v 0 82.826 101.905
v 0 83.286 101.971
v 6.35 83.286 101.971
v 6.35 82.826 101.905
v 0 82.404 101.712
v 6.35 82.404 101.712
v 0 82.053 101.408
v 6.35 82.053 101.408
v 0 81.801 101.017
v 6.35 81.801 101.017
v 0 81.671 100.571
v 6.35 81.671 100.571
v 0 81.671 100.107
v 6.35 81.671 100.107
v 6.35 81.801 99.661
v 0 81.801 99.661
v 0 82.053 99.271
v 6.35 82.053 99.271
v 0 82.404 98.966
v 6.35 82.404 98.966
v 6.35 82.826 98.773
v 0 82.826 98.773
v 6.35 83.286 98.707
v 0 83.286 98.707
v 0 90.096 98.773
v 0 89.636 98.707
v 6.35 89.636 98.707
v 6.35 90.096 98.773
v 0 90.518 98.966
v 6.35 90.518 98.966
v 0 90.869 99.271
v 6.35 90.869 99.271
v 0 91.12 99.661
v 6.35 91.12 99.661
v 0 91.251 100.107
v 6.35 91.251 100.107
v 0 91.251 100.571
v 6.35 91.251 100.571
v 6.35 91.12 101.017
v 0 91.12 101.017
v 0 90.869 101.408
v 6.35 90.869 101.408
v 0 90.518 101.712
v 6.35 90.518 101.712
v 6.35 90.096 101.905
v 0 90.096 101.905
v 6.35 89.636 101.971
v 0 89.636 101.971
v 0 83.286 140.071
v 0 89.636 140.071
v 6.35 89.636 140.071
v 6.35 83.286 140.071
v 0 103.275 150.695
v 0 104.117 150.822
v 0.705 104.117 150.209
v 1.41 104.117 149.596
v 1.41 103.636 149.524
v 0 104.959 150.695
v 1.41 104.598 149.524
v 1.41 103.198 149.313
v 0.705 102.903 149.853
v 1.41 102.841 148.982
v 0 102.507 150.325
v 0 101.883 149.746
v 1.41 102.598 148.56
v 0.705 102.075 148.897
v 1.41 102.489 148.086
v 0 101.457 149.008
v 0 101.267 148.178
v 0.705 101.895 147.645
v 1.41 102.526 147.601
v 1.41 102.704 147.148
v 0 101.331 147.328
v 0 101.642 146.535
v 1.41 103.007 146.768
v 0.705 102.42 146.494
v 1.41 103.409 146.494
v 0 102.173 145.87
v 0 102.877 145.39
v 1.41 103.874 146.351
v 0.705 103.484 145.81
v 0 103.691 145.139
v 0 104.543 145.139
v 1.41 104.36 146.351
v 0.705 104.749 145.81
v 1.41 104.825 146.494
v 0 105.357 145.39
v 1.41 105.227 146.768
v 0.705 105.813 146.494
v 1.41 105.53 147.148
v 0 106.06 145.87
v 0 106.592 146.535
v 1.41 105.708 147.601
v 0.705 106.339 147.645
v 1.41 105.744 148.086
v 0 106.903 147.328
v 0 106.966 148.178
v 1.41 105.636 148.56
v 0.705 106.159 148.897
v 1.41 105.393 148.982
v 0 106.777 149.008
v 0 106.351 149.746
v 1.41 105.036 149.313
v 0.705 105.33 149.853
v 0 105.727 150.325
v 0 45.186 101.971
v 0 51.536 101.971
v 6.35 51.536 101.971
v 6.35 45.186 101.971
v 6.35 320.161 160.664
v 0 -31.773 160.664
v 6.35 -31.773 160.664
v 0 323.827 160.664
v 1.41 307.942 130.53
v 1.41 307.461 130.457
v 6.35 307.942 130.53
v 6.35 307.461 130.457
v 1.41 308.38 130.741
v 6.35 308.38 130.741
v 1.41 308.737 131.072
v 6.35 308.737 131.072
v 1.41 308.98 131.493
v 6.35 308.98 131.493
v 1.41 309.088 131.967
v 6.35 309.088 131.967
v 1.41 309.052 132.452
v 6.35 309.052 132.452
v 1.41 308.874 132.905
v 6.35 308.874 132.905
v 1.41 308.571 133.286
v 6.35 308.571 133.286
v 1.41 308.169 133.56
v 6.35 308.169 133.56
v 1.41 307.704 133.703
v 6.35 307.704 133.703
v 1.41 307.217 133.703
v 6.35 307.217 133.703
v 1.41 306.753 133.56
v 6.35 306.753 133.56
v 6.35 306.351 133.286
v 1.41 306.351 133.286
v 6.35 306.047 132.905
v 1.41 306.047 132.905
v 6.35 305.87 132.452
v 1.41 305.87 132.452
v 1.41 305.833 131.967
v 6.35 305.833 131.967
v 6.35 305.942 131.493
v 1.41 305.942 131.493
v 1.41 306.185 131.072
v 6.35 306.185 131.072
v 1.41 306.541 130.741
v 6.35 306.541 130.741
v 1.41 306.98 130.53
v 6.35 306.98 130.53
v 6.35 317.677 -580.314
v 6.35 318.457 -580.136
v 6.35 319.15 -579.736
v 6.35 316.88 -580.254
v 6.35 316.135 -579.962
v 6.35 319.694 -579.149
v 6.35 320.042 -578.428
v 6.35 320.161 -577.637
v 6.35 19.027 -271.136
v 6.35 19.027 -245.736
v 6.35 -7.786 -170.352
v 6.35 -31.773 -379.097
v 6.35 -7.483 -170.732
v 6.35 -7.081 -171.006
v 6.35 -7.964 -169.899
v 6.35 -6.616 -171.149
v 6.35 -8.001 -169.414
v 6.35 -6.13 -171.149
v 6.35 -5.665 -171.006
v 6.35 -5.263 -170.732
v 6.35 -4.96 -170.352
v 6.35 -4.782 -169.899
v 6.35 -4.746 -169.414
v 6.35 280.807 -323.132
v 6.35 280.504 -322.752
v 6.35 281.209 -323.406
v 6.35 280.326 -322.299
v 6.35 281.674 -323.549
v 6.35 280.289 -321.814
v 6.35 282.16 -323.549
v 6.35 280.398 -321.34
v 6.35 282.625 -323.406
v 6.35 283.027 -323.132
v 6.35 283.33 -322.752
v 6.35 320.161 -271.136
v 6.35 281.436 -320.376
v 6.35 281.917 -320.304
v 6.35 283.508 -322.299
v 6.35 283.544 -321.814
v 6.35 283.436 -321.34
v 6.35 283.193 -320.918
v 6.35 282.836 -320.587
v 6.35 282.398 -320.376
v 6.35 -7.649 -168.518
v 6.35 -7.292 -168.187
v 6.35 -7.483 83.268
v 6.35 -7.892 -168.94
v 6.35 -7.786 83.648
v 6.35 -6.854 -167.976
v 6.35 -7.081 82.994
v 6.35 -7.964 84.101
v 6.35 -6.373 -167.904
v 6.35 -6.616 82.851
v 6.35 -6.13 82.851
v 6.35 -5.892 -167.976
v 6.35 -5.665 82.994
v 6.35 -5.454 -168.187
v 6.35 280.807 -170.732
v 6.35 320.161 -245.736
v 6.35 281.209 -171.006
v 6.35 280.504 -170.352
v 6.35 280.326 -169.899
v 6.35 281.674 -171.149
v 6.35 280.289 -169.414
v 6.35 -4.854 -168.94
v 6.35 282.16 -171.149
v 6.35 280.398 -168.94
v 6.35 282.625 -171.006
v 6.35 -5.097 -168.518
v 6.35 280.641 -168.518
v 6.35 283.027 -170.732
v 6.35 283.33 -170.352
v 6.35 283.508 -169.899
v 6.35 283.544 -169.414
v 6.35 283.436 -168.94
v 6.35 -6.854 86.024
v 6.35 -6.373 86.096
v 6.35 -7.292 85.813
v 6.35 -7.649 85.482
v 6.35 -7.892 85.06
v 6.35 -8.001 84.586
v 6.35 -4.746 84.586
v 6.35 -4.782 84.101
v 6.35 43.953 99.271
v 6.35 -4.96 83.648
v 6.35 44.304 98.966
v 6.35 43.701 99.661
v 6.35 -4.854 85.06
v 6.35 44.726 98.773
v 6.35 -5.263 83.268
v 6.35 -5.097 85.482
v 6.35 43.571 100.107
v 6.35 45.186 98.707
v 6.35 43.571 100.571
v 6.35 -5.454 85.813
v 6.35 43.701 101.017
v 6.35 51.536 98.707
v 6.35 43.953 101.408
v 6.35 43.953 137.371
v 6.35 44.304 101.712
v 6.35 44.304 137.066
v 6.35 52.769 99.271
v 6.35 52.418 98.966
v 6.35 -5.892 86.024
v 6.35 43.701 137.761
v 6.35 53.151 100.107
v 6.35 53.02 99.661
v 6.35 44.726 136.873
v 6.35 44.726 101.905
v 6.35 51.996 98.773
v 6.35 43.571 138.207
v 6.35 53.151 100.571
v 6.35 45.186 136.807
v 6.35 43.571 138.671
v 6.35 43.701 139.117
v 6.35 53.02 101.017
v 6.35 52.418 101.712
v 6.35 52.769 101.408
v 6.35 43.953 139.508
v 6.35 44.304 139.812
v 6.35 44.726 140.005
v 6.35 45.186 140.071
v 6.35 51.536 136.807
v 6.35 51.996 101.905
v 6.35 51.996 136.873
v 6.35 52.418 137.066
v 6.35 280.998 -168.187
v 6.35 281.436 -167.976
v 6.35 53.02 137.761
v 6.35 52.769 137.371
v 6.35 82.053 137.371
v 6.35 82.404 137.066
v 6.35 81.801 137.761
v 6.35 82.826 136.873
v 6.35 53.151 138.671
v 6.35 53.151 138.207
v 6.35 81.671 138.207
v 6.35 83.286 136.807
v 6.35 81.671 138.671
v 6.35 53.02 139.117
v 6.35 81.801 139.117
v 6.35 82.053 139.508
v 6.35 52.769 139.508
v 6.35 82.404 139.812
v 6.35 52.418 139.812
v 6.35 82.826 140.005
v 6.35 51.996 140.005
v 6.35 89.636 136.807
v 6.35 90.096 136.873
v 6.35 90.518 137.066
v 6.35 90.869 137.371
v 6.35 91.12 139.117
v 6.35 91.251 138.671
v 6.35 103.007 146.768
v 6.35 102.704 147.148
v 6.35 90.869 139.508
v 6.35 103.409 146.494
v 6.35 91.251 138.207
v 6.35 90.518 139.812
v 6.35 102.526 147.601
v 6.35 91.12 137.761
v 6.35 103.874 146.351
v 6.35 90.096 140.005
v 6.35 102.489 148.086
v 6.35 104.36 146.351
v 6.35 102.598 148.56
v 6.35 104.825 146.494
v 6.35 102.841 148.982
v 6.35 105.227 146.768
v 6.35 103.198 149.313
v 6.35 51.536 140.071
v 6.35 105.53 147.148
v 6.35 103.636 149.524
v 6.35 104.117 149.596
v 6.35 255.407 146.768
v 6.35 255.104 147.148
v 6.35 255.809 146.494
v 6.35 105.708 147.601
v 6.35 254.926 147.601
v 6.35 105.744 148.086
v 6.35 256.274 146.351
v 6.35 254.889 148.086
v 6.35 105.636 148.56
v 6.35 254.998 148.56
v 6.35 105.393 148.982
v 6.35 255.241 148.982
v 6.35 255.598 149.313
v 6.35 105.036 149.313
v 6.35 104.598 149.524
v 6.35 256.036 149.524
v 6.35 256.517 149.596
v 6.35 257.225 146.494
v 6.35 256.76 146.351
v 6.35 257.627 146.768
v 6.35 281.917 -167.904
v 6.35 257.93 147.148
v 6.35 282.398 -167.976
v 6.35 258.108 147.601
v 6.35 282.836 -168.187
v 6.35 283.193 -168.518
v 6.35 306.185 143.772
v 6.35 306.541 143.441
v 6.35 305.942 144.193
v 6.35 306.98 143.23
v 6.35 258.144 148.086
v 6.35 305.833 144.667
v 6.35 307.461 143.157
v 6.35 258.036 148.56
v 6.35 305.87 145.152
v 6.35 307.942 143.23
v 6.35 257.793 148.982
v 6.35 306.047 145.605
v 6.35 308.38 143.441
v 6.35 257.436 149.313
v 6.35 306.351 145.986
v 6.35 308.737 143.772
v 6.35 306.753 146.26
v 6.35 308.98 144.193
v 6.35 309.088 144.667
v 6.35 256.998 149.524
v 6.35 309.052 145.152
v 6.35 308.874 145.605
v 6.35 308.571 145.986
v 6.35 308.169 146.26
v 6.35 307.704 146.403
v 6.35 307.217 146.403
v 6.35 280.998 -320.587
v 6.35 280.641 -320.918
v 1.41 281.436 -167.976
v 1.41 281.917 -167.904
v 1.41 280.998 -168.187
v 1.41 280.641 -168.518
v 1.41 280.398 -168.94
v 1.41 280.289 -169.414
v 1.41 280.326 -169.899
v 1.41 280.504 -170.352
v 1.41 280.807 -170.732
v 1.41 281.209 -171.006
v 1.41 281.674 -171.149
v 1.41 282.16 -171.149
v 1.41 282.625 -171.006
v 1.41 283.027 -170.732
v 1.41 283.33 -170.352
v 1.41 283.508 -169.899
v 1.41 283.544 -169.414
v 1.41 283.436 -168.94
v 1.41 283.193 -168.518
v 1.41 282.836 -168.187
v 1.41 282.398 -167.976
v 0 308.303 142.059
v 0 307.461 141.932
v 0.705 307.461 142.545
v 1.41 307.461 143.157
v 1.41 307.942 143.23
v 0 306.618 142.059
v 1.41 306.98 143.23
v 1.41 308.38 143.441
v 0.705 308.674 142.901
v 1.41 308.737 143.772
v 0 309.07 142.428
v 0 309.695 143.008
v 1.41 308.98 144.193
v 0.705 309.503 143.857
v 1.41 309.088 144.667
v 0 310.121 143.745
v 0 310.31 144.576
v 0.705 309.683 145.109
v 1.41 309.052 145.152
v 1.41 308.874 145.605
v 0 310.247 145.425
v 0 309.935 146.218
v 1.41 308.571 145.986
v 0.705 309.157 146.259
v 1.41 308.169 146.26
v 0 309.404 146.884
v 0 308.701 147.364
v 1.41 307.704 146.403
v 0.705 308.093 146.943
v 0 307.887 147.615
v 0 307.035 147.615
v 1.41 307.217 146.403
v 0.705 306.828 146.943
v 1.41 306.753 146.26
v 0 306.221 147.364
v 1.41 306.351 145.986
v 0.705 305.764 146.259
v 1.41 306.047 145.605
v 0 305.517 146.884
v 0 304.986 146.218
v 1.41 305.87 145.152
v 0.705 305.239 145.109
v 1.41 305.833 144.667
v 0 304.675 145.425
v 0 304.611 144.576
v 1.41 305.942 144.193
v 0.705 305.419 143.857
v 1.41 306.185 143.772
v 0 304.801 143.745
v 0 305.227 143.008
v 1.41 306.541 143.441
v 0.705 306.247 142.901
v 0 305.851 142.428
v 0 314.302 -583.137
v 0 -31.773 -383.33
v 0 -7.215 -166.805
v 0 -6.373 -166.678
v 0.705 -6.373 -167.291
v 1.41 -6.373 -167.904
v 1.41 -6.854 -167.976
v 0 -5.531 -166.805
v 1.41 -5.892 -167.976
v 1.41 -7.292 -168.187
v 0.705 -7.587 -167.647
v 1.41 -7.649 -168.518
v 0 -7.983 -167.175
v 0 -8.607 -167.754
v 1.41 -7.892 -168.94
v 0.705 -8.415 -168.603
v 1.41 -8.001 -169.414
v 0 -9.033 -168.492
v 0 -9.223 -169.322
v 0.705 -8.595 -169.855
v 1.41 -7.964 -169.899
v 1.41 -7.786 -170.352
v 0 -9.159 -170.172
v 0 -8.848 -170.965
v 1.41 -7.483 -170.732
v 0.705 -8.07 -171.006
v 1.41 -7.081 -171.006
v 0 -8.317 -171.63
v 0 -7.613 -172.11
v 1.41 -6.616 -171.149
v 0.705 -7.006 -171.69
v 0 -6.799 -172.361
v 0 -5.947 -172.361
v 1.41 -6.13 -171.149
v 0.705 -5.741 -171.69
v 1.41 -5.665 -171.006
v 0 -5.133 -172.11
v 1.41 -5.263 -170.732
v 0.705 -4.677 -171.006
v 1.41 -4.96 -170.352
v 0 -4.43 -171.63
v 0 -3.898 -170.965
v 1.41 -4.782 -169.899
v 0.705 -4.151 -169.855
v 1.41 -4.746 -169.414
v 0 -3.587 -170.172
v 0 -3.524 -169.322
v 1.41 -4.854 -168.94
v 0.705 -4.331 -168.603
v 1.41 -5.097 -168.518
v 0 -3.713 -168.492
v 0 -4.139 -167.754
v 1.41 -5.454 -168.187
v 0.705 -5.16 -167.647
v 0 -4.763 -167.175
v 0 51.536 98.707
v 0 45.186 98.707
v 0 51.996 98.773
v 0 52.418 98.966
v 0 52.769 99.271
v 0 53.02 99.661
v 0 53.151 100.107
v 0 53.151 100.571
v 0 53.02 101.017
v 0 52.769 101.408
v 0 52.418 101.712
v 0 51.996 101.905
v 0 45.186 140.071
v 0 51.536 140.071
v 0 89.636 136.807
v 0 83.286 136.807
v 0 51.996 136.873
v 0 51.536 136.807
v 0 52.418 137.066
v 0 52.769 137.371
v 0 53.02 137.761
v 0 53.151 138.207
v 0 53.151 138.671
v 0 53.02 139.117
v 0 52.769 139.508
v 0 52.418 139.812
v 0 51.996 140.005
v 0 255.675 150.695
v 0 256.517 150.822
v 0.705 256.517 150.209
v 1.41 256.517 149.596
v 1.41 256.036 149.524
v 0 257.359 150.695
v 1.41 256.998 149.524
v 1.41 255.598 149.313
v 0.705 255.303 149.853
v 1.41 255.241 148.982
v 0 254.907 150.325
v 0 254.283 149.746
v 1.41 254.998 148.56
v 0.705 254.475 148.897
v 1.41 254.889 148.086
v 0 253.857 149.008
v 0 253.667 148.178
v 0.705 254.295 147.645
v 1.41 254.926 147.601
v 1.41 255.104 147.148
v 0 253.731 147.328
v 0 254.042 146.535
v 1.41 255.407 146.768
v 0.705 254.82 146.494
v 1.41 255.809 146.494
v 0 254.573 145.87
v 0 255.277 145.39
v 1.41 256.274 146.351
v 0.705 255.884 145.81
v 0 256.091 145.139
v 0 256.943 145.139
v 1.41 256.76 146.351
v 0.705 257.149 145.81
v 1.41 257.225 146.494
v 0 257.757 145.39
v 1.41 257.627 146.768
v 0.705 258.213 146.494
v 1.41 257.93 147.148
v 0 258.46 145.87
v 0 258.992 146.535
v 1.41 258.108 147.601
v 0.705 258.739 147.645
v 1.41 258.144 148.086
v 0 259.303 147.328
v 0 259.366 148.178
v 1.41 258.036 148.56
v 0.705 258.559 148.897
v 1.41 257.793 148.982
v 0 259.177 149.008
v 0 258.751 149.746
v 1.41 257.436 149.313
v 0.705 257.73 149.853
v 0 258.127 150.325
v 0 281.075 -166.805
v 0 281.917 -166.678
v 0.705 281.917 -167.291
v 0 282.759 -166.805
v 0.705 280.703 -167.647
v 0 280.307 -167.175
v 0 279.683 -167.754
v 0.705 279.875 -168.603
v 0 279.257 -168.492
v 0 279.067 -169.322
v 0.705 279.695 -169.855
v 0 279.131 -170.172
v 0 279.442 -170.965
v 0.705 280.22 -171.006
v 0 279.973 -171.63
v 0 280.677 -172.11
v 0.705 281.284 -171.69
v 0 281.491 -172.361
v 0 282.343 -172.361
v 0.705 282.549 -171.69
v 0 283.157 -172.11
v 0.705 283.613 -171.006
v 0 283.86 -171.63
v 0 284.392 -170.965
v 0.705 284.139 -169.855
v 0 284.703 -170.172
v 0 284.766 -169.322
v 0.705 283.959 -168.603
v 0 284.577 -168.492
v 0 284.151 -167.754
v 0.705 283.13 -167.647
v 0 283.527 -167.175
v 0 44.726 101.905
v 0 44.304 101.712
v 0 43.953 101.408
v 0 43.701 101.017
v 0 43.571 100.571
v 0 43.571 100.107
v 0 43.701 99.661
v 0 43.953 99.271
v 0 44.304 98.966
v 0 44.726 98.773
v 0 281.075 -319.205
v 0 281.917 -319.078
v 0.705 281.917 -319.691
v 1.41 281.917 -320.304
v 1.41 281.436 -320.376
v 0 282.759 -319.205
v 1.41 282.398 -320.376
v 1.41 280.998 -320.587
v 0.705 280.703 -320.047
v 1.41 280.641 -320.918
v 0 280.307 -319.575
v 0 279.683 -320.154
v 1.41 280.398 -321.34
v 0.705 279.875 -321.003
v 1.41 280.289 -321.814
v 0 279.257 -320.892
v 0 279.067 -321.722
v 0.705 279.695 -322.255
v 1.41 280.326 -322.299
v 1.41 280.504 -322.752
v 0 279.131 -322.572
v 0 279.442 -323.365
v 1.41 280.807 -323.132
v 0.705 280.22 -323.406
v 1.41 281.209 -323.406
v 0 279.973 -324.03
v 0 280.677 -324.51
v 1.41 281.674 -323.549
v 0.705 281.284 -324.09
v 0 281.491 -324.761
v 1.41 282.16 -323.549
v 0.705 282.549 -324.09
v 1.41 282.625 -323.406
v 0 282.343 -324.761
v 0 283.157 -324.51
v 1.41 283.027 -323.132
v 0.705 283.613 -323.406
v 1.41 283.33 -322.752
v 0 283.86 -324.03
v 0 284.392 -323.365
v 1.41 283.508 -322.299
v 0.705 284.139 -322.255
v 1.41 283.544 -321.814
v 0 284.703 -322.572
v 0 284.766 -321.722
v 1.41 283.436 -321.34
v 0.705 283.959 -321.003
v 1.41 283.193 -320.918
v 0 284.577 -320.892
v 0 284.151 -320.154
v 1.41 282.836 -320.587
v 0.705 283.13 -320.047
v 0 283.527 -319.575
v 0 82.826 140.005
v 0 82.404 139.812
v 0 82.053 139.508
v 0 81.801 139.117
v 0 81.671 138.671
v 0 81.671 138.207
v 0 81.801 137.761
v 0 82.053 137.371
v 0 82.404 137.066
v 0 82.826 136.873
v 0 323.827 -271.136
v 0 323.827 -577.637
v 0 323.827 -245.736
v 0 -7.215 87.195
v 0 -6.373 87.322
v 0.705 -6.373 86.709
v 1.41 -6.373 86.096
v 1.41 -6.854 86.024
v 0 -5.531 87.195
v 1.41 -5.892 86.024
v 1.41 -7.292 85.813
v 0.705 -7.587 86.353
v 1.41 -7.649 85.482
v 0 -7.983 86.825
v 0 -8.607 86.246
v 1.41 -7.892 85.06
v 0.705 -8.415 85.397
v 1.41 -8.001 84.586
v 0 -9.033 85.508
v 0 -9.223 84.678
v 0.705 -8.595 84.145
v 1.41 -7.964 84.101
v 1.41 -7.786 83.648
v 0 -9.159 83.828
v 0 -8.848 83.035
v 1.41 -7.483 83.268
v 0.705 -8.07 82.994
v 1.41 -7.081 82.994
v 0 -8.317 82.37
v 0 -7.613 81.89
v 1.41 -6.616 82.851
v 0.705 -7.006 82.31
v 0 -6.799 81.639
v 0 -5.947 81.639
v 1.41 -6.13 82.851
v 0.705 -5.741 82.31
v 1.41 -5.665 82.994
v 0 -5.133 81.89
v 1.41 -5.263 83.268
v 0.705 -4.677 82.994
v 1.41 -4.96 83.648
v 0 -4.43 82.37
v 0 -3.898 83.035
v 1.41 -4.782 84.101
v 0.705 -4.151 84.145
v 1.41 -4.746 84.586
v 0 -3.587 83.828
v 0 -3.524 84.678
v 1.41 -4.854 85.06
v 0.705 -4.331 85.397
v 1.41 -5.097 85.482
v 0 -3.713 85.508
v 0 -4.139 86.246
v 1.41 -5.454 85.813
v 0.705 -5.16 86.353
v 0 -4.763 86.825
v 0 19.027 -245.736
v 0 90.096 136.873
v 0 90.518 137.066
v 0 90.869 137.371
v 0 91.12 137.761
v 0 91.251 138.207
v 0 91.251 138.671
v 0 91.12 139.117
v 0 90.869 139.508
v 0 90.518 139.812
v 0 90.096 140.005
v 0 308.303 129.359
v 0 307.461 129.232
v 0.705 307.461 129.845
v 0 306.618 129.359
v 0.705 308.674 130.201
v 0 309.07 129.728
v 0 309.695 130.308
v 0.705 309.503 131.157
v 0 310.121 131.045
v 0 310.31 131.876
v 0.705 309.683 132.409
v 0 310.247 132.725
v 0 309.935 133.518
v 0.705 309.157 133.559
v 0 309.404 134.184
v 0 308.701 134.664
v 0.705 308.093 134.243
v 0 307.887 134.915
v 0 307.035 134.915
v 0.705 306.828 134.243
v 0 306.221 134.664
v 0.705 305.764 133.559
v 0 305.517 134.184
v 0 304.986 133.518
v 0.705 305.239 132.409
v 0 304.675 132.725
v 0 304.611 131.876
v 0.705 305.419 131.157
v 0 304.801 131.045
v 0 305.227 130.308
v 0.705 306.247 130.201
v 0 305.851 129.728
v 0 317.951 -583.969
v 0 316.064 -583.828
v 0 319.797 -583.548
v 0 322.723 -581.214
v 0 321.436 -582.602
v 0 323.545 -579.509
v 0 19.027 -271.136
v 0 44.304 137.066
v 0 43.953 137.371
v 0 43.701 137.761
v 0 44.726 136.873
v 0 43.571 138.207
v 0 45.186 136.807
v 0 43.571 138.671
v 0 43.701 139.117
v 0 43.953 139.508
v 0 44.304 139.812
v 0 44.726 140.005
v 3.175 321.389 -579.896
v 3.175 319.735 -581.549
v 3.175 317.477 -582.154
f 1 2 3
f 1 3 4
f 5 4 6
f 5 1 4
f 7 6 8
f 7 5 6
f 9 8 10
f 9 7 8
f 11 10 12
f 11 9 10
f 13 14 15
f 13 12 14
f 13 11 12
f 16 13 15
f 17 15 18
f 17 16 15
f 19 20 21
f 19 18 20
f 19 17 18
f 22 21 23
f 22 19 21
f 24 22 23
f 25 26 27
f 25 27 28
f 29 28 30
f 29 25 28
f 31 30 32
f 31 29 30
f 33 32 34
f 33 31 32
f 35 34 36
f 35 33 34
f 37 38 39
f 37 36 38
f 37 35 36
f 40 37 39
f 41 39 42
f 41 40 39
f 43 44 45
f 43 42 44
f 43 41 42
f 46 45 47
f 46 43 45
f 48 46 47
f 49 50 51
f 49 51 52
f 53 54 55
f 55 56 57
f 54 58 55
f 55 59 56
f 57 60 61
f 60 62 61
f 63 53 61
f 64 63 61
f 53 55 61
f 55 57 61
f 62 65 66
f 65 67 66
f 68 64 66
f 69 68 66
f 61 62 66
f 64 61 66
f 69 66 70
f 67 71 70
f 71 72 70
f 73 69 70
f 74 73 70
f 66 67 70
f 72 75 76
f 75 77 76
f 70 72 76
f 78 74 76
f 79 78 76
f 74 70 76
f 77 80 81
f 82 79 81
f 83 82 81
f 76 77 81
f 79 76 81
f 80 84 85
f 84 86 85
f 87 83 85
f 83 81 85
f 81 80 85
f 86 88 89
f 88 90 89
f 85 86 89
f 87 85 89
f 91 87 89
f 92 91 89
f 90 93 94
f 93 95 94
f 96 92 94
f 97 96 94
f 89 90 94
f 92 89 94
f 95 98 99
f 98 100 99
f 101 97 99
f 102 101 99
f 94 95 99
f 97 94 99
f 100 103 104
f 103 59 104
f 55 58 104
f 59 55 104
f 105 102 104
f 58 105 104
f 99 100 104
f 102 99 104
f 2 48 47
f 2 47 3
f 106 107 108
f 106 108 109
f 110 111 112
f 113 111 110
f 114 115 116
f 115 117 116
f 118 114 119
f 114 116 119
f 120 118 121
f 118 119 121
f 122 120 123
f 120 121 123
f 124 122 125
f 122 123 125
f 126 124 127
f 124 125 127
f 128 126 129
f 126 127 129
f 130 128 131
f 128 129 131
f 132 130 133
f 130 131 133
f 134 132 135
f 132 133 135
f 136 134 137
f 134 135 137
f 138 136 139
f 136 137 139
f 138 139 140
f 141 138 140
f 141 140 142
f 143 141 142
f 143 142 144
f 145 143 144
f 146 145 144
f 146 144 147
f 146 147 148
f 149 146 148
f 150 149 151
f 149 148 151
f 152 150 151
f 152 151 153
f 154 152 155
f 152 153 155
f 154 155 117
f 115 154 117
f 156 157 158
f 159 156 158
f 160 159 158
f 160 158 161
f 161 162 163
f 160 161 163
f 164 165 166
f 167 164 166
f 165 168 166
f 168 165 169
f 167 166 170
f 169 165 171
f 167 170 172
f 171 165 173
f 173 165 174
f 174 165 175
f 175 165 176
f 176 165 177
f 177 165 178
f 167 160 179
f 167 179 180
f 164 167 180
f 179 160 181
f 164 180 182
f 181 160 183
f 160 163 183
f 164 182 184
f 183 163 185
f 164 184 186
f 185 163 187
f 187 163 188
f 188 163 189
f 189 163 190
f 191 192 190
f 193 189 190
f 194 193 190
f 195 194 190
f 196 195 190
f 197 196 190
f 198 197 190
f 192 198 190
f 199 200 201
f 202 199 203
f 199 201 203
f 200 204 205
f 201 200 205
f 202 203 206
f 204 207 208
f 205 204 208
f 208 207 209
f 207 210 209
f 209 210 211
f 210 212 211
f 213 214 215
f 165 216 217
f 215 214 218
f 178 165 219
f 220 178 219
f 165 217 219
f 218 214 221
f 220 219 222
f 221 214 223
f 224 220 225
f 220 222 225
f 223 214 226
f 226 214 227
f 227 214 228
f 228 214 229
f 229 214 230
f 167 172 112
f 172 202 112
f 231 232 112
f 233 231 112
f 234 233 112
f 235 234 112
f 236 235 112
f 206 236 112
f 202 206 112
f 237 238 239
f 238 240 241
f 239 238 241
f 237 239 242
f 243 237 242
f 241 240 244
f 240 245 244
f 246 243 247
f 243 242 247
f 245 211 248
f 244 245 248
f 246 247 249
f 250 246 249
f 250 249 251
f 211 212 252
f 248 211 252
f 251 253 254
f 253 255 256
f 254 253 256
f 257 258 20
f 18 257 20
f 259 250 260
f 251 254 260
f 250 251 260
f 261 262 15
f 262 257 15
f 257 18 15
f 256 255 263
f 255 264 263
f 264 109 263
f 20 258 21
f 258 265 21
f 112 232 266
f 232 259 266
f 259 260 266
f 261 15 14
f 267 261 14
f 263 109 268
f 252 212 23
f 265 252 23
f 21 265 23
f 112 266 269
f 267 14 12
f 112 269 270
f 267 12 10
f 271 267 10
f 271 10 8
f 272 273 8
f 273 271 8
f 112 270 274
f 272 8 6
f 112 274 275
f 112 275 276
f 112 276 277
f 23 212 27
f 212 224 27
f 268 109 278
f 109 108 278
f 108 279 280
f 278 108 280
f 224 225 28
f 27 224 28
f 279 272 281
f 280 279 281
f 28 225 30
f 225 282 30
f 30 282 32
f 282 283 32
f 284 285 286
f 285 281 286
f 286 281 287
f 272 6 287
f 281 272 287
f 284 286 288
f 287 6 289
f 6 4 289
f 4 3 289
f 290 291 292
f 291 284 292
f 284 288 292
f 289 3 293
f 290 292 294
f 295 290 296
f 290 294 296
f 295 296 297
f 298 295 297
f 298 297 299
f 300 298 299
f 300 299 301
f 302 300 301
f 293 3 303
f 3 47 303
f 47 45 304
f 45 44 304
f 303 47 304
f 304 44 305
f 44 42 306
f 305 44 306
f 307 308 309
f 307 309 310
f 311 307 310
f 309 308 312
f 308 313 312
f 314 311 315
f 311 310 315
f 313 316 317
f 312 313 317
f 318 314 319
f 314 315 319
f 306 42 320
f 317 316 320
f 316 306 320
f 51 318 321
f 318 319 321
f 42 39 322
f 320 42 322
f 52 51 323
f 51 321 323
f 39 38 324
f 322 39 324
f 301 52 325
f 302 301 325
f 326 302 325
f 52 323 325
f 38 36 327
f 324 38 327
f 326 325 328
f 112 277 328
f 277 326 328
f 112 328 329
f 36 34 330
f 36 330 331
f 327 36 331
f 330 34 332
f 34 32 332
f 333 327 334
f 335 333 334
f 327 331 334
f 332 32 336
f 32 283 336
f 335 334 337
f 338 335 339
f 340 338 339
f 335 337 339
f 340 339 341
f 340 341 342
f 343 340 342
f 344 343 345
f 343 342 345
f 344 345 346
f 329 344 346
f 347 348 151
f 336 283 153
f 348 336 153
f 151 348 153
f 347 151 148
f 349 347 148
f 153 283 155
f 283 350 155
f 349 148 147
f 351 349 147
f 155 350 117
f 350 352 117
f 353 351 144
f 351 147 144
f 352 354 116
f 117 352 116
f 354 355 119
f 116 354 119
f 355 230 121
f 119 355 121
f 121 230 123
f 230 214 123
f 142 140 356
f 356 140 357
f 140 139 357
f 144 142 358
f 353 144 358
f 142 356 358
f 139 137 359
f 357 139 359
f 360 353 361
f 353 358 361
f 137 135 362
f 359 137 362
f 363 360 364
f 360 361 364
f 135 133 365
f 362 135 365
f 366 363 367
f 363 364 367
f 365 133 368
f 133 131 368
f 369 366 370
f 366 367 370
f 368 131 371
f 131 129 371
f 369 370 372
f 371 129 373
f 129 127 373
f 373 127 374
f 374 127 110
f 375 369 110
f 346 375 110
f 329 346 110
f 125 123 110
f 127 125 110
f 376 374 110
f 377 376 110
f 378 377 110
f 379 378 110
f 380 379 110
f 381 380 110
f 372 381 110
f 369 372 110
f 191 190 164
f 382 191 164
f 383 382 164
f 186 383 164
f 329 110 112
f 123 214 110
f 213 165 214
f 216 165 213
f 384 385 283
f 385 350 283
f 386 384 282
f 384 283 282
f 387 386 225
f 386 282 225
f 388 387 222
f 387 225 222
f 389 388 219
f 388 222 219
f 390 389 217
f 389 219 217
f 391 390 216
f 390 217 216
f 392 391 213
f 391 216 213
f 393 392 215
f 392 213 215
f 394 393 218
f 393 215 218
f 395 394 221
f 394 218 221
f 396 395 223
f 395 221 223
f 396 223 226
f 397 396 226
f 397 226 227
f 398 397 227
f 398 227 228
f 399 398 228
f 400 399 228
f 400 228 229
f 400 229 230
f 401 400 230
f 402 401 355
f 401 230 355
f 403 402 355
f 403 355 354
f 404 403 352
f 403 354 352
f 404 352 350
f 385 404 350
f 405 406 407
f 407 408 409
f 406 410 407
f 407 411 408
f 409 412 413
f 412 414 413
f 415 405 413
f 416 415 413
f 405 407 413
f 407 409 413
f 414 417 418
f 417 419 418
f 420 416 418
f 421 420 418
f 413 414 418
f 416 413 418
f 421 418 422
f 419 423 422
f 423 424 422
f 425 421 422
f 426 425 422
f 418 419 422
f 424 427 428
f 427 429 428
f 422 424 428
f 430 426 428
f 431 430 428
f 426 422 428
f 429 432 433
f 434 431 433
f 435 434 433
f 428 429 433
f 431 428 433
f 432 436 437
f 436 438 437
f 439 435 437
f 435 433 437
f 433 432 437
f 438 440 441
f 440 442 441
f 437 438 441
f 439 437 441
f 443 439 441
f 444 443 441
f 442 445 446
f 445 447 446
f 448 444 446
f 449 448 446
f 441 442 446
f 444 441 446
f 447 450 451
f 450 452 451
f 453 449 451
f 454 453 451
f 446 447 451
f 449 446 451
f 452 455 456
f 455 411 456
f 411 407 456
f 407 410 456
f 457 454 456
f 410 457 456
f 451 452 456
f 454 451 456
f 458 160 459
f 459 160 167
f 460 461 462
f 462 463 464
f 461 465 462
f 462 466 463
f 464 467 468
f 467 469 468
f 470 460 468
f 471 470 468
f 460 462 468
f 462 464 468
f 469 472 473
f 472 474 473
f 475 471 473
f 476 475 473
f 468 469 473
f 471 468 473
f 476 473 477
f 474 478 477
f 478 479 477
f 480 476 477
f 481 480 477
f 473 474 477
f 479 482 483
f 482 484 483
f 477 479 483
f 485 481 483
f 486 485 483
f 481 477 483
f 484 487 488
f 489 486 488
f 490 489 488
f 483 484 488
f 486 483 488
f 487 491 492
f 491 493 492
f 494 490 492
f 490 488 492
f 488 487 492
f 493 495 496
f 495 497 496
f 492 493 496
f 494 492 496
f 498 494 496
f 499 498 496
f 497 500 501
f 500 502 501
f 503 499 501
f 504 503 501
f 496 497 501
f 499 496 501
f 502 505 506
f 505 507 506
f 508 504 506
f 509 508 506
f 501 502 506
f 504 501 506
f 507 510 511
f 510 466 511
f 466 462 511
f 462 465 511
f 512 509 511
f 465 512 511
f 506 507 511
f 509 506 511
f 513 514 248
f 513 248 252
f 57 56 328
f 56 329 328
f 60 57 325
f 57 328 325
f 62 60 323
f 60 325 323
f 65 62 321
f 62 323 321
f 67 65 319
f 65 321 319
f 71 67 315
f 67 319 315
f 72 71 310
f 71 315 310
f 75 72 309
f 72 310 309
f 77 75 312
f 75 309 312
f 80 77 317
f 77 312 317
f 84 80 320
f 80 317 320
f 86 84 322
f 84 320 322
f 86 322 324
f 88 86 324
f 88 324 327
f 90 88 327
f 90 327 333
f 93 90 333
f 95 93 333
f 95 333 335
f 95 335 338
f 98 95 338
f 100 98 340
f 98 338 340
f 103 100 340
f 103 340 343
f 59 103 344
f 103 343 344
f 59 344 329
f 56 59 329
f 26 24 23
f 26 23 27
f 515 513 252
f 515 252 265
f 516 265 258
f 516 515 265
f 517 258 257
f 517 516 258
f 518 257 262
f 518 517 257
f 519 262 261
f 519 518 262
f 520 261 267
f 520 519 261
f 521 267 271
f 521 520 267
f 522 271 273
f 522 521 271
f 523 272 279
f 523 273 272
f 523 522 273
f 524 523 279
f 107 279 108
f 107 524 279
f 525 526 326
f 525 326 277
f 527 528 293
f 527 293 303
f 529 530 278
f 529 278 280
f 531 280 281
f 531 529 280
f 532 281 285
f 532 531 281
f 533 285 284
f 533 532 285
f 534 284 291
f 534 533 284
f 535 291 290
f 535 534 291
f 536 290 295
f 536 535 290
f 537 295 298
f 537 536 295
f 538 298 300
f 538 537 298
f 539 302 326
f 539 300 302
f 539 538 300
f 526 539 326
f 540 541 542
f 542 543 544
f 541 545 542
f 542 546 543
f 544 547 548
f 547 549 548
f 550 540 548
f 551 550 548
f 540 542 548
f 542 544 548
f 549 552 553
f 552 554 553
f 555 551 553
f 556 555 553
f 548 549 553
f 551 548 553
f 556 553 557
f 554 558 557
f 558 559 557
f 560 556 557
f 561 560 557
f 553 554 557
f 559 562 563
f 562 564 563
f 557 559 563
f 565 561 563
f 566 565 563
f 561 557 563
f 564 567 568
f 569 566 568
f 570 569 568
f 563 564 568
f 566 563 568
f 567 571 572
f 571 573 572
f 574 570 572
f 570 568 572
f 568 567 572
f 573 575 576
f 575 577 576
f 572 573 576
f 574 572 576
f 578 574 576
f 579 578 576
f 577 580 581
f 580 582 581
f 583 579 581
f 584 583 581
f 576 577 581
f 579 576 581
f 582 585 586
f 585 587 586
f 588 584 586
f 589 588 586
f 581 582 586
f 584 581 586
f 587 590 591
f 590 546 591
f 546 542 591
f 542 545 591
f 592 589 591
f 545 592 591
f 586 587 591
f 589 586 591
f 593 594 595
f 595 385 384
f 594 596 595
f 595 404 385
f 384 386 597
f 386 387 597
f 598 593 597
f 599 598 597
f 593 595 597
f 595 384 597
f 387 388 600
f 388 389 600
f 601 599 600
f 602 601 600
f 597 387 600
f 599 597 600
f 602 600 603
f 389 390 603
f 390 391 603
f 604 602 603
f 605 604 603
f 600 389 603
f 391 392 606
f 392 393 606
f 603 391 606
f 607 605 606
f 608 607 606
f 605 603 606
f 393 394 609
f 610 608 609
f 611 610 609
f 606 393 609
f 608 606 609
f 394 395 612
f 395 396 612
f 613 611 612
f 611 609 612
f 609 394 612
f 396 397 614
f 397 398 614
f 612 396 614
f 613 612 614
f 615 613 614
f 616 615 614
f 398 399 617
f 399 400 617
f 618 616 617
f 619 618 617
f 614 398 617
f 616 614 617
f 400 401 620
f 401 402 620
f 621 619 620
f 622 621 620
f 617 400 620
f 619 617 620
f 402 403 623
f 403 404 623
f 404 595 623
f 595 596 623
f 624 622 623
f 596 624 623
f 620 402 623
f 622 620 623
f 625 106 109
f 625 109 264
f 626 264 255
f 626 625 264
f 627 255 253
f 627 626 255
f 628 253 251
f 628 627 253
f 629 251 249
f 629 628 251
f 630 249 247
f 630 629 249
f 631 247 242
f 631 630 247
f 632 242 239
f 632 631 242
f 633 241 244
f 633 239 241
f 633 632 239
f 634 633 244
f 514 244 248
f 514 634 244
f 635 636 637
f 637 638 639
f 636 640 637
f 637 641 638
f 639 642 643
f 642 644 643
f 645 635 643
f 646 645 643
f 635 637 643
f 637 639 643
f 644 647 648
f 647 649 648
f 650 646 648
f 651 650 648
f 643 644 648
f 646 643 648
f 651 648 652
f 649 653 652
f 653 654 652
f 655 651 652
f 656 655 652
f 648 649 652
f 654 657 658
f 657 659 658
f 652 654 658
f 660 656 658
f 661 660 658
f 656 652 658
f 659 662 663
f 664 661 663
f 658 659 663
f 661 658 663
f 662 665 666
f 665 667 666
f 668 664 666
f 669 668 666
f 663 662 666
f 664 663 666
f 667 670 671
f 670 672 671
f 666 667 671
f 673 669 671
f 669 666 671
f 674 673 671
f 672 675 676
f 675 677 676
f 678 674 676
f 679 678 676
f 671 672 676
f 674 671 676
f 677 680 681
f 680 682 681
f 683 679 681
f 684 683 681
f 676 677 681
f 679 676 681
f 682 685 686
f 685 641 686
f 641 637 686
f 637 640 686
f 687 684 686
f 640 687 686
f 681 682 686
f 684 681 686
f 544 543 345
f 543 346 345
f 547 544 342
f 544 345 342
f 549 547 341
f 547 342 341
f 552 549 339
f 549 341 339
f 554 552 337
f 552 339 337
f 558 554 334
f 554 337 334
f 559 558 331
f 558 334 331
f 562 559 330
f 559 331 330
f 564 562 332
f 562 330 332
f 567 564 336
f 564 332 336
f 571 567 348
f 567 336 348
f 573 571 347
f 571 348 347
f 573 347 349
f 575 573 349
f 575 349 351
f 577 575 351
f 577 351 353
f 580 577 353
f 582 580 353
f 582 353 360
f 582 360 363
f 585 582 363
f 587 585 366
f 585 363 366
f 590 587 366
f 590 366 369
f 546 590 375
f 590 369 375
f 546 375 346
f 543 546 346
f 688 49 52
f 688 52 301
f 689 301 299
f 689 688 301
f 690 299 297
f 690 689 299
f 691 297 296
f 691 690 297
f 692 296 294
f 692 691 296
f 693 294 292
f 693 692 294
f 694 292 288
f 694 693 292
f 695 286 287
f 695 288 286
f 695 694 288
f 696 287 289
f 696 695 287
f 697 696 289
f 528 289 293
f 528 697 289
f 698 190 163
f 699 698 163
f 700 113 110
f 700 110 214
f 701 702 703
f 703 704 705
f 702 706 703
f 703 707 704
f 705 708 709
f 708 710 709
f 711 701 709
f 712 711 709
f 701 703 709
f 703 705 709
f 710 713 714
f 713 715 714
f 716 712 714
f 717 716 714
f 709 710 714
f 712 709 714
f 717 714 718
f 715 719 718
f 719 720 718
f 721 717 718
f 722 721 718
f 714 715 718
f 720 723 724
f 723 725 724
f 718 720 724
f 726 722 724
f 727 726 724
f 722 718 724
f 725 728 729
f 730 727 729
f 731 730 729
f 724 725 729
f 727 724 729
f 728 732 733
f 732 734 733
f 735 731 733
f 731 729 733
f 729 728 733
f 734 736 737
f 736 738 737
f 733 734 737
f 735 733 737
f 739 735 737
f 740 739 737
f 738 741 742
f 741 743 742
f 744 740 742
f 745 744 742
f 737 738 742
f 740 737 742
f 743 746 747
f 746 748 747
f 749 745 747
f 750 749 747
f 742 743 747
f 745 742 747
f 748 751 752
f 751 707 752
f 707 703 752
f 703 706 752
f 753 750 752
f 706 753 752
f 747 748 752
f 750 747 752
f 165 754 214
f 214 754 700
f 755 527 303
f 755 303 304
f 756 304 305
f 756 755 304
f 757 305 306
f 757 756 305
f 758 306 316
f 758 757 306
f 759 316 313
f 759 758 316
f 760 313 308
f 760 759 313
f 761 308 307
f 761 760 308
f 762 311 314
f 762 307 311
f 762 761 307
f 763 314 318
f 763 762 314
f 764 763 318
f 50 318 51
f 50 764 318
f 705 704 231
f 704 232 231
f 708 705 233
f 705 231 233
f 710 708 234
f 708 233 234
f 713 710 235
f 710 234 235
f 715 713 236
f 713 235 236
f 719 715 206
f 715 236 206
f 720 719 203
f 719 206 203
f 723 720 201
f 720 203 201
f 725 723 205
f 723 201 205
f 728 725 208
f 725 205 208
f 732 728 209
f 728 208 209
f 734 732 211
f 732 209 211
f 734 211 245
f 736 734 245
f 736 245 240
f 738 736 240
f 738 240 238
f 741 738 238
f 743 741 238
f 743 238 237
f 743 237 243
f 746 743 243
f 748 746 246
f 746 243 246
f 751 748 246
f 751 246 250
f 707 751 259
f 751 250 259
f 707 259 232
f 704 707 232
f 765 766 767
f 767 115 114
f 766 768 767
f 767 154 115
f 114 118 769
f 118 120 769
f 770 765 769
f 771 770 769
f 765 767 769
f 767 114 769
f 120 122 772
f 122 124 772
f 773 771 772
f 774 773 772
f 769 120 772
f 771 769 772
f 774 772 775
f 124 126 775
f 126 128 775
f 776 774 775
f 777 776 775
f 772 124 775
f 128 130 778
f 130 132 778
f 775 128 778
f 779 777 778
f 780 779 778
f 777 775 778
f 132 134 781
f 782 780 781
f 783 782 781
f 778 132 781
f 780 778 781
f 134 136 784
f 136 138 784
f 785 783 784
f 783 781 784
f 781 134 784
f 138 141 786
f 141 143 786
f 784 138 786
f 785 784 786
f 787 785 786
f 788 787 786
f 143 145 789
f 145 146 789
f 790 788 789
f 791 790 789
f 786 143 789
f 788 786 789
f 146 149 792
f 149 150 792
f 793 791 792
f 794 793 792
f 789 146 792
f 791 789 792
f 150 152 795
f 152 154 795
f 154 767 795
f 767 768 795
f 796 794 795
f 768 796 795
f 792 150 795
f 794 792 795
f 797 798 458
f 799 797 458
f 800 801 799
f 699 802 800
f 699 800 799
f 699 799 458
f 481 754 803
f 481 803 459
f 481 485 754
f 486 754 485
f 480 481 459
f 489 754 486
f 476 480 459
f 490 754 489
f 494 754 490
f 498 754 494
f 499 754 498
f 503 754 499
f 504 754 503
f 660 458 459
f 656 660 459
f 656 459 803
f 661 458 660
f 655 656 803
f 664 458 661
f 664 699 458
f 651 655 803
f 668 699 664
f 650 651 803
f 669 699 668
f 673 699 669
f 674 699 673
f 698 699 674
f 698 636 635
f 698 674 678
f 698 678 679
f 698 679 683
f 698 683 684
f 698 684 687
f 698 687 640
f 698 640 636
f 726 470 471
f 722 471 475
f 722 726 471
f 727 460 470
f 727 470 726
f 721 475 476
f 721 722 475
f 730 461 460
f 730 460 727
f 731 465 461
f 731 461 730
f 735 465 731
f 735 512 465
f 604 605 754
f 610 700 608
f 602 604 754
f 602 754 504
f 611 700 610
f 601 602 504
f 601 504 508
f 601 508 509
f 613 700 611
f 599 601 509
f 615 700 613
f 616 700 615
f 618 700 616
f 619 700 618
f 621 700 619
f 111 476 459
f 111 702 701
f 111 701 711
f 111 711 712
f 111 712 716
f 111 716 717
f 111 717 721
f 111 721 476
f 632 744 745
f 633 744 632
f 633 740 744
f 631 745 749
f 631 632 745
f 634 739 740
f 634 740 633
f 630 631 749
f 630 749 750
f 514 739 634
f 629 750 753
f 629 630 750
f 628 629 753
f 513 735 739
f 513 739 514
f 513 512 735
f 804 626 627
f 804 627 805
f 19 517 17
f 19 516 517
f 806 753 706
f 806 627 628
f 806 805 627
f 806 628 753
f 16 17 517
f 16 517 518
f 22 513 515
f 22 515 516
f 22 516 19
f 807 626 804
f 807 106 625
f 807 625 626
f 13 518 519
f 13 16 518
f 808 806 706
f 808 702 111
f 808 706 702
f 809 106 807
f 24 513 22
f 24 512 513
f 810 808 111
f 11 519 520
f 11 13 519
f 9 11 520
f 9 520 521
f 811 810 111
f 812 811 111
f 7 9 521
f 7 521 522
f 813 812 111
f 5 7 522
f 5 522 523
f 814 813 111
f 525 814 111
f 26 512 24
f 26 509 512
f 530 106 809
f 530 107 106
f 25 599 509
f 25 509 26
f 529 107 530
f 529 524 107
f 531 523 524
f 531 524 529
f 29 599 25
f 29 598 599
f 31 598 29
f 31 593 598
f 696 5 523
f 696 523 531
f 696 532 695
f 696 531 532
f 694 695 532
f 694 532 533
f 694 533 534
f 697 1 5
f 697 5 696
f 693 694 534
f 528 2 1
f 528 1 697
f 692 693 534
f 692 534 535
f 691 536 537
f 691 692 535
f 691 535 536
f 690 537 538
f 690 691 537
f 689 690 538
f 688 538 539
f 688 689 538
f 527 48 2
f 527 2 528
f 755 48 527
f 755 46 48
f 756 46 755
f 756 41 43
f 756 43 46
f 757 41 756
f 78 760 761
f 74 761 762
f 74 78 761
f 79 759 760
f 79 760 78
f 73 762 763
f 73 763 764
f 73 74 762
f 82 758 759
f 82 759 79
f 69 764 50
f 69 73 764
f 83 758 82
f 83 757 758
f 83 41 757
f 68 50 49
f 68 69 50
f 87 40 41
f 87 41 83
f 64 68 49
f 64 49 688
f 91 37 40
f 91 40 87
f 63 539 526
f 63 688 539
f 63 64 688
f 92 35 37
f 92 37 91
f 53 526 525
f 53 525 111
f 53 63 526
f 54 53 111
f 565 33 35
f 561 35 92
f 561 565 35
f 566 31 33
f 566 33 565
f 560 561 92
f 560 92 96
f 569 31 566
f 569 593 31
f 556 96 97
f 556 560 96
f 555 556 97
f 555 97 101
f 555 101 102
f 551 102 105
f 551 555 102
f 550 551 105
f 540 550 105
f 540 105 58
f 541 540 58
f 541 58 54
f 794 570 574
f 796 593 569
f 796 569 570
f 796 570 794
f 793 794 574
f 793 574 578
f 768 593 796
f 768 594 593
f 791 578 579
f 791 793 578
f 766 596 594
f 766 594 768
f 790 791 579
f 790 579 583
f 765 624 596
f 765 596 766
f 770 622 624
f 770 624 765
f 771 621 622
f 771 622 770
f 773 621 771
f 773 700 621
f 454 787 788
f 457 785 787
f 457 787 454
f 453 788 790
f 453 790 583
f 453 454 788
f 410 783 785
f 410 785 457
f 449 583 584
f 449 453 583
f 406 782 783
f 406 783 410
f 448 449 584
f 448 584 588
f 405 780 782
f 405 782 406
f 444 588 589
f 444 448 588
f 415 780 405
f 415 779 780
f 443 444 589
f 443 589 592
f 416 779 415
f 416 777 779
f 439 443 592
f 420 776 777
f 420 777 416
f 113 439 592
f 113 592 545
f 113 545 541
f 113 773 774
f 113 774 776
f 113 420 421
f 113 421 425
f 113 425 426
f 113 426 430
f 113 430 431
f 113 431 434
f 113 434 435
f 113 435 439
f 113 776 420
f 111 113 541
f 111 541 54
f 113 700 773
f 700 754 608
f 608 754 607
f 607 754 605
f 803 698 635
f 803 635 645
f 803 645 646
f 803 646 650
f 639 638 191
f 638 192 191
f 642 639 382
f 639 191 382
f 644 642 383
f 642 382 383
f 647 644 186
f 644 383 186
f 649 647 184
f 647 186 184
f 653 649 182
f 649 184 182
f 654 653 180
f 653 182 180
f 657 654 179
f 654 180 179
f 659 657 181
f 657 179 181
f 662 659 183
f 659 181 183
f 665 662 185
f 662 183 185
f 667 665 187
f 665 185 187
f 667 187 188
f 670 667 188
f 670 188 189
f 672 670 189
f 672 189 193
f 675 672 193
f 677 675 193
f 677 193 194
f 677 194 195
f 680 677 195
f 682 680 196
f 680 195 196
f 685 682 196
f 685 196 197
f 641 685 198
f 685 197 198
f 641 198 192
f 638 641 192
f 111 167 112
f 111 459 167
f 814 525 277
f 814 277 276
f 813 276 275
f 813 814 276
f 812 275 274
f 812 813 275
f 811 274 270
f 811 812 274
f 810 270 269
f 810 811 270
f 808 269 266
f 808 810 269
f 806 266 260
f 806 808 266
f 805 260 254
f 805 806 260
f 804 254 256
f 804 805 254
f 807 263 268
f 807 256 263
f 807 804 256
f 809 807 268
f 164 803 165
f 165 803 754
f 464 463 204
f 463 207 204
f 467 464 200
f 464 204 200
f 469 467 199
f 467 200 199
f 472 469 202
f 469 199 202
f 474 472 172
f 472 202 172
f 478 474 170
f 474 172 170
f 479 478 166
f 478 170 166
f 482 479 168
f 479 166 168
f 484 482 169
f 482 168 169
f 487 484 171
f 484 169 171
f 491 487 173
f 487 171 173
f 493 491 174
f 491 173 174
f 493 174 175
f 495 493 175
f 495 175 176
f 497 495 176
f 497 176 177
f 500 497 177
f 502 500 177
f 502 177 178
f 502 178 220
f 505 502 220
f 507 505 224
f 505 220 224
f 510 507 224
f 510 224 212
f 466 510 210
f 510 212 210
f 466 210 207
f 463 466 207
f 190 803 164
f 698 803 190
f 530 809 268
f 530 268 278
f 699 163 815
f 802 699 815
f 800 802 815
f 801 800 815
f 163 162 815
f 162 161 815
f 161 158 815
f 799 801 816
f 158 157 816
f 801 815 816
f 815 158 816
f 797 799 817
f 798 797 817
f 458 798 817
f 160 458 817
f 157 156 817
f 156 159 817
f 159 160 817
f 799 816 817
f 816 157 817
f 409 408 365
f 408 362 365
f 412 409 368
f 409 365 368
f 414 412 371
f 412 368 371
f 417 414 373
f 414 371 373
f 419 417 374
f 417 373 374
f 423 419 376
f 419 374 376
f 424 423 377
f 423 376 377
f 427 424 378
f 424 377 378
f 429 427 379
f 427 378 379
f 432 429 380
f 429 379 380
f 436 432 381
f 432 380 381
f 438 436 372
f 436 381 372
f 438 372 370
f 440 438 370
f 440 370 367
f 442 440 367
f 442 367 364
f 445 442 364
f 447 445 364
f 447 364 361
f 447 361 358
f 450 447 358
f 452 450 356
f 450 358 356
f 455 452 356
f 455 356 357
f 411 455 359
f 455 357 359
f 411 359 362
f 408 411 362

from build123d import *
from OCP.BRepFilletAPI import BRepFilletAPI_MakeChamfer

# Parameters (mm, degrees)
BOSS_EXTRUDE1_DEPTH                            = 6.35
SKETCH2_W                                      = 25.4
SKETCH2_H                                      = 304.8
CUT_EXTRUDE1_DEPTH                             = 672.86027017
FILLET1_R                                      = 6.35
CHAMFER3_SIZE                                  = 3.666174209
CHAMFER3_SIZE_2                                = 6.35
CSK_FOR_4_FLAT_HEAD_MACHINE_SCREW1_D           = 3.2639
CSK_FOR_4_FLAT_HEAD_MACHINE_SCREW1_CSINK_D     = 5.715
CSK_FOR_4_FLAT_HEAD_MACHINE_SCREW1_CSINK_ANGLE = 82
CUT_EXTRUDE2_REACH                             = 669.791
CSK_FOR_4_FLAT_HEAD_MACHINE_SCREW2_D           = 3.2639
CSK_FOR_4_FLAT_HEAD_MACHINE_SCREW2_CSINK_D     = 5.715
CSK_FOR_4_FLAT_HEAD_MACHINE_SCREW2_CSINK_ANGLE = 82


with BuildPart() as part:
    # Sketch1 → Boss-Extrude1 (new body)
    with BuildSketch(Plane(origin=(0, 0, 0), x_dir=(0, 0, -1), z_dir=(1, 0, 0))):
        Polygon((588.635764647, 323.826862244), (383.330008924, -31.773137756), (-160.664235353, -31.773137756), (-160.664235353, 323.826862244), align=None)
    extrude(amount=BOSS_EXTRUDE1_DEPTH)

    # Sketch2 → Cut-Extrude1 (cut, through all)
    with BuildSketch(Plane.ZY):
        with Locations((-258.435764647, 171.426862244)):
            Rectangle(SKETCH2_W, SKETCH2_H)
    extrude(amount=-CUT_EXTRUDE1_DEPTH, mode=Mode.SUBTRACT)

    # Fillet1
    fillet1_edges = [part.edges().sort_by_distance(p)[0] for p in [
        (3.175, 323.826862244, -588.635764647),
    ]]
    fillet(fillet1_edges, radius=FILLET1_R)

    # Chamfer3
    chamfer3_edges_1 = [part.edges().sort_by_distance(p)[0] for p in [
        (6.35, 323.826862244, -42.535764647),
    ]]
    chamfer3_side_1 = [part.faces().sort_by_distance(p)[0] for p in [
        (6.35, 323.753538759, -42.535764647),
    ]]
    chamfer3_edges_2 = [part.edges().sort_by_distance(p)[0] for p in [
        (6.35, 141.264362244, -483.233256128),
    ]]
    chamfer3_side_2 = [part.faces().sort_by_distance(p)[0] for p in [
        (6.276676516, 141.264362244, -483.233256128),
    ]]
    chamfer3_edges_3 = [part.edges().sort_by_distance(p)[0] for p in [
        (6.35, 320.651862244, -583.136503333),
    ]]
    chamfer3_side_3 = [part.faces().sort_by_distance(p)[0] for p in [
        (6.276676516, 320.651862244, -583.136503333),
    ]]
    chamfer3_edges_4 = [part.edges().sort_by_distance(p)[0] for p in [
        (6.35, 323.826862244, -424.386503333),
    ]]
    chamfer3_side_4 = [part.faces().sort_by_distance(p)[0] for p in [
        (6.35, 323.753538759, -424.386503333),
    ]]
    chamfer3 = BRepFilletAPI_MakeChamfer(part.part.solid().wrapped)
    for e in chamfer3_edges_1:
        chamfer3.Add(CHAMFER3_SIZE - 0.0001, CHAMFER3_SIZE_2 - 0.0001, e.wrapped, chamfer3_side_1[0].wrapped)
    for e in chamfer3_edges_2:
        chamfer3.Add(CHAMFER3_SIZE_2 - 0.0001, CHAMFER3_SIZE - 0.0001, e.wrapped, chamfer3_side_2[0].wrapped)
    for e in chamfer3_edges_3:
        chamfer3.Add(CHAMFER3_SIZE_2 - 0.0001, CHAMFER3_SIZE - 0.0001, e.wrapped, chamfer3_side_3[0].wrapped)
    for e in chamfer3_edges_4:
        chamfer3.Add(CHAMFER3_SIZE - 0.0001, CHAMFER3_SIZE_2 - 0.0001, e.wrapped, chamfer3_side_4[0].wrapped)
    add(Compound.cast(chamfer3.Shape()), mode=Mode.REPLACE)  # a hair under: the kernel refuses the full size

    # CSK for #4 Flat Head Machine Screw1 (through all)
    with Locations(Plane(origin=(0, 256.516862244, 147.964235353), x_dir=(0, 0, -1), z_dir=(-1, 0, 0))):
        with Locations((0, 0), (317.5, -25.4), (469.9, -25.4), (0, 152.4), (63.5, 262.89), (317.5, 262.89)):
            CounterSinkHole(CSK_FOR_4_FLAT_HEAD_MACHINE_SCREW1_D / 2, CSK_FOR_4_FLAT_HEAD_MACHINE_SCREW1_CSINK_D / 2, counter_sink_angle=CSK_FOR_4_FLAT_HEAD_MACHINE_SCREW1_CSINK_ANGLE)

    # Sketch7 → Cut-Extrude2 (cut, up to next)
    with BuildSketch(Plane.ZY, mode=Mode.PRIVATE) as cut_extrude2_sk1:
        with BuildLine():
            Line((140.071185353, 89.635966927), (140.071185353, 83.285966927))
            ThreePointArc((140.071185353, 83.285966927), (138.439235353, 81.654016927), (136.807285353, 83.285966927))
            Line((136.807285353, 83.285966927), (136.807285353, 89.635966927))
            ThreePointArc((136.807285353, 89.635966927), (138.439235353, 91.267916927), (140.071185353, 89.635966927))
        make_face()
    cut_extrude2_tool1 = extrude(cut_extrude2_sk1.sketch, amount=-CUT_EXTRUDE2_REACH, mode=Mode.PRIVATE) & part.part
    # Sketch7 → Cut-Extrude2 (cut, up to next)
    with BuildSketch(Plane.ZY, mode=Mode.PRIVATE) as cut_extrude2_sk2:
        with BuildLine():
            Line((98.707285353, 83.285966927), (98.707285353, 89.635966927))
            ThreePointArc((98.707285353, 89.635966927), (100.339235353, 91.267916927), (101.971185353, 89.635966927))
            Line((101.971185353, 89.635966927), (101.971185353, 83.285966927))
            ThreePointArc((101.971185353, 83.285966927), (100.339235353, 81.654016927), (98.707285353, 83.285966927))
        make_face()
    cut_extrude2_tool2 = extrude(cut_extrude2_sk2.sketch, amount=-CUT_EXTRUDE2_REACH, mode=Mode.PRIVATE) & part.part
    # Sketch7 → Cut-Extrude2 (cut, up to next)
    with BuildSketch(Plane.ZY, mode=Mode.PRIVATE) as cut_extrude2_sk3:
        with BuildLine():
            Line((98.707285353, 45.185966927), (98.707285353, 51.535966927))
            ThreePointArc((98.707285353, 51.535966927), (100.339235353, 53.167916927), (101.971185353, 51.535966927))
            Line((101.971185353, 51.535966927), (101.971185353, 45.185966927))
            ThreePointArc((101.971185353, 45.185966927), (100.339235353, 43.554016927), (98.707285353, 45.185966927))
        make_face()
    cut_extrude2_tool3 = extrude(cut_extrude2_sk3.sketch, amount=-CUT_EXTRUDE2_REACH, mode=Mode.PRIVATE) & part.part
    # Sketch7 → Cut-Extrude2 (cut, up to next)
    with BuildSketch(Plane.ZY, mode=Mode.PRIVATE) as cut_extrude2_sk4:
        with BuildLine():
            Line((136.807285353, 45.185966927), (136.807285353, 51.535966927))
            ThreePointArc((136.807285353, 51.535966927), (138.439235353, 53.167916927), (140.071185353, 51.535966927))
            Line((140.071185353, 51.535966927), (140.071185353, 45.185966927))
            ThreePointArc((140.071185353, 45.185966927), (138.439235353, 43.554016927), (136.807285353, 45.185966927))
        make_face()
    cut_extrude2_tool4 = extrude(cut_extrude2_sk4.sketch, amount=-CUT_EXTRUDE2_REACH, mode=Mode.PRIVATE) & part.part
    add(cut_extrude2_tool1.solids().sort_by_distance((0, 86.460967, 138.439235))[0], mode=Mode.SUBTRACT)
    add(cut_extrude2_tool2.solids().sort_by_distance((0, 86.460967, 100.339235))[0], mode=Mode.SUBTRACT)
    add(cut_extrude2_tool3.solids().sort_by_distance((0, 48.360967, 100.339235))[0], mode=Mode.SUBTRACT)
    add(cut_extrude2_tool4.solids().sort_by_distance((0, 48.360967, 138.439235))[0], mode=Mode.SUBTRACT)

    # CSK for #4 Flat Head Machine Screw2 (through all)
    with Locations(Plane.ZY):
        with Locations((132.089235353, 307.460688034), (144.789235353, 307.460688034)):
            CounterSinkHole(CSK_FOR_4_FLAT_HEAD_MACHINE_SCREW2_D / 2, CSK_FOR_4_FLAT_HEAD_MACHINE_SCREW2_CSINK_D / 2, counter_sink_angle=CSK_FOR_4_FLAT_HEAD_MACHINE_SCREW2_CSINK_ANGLE)


solid = part.part
